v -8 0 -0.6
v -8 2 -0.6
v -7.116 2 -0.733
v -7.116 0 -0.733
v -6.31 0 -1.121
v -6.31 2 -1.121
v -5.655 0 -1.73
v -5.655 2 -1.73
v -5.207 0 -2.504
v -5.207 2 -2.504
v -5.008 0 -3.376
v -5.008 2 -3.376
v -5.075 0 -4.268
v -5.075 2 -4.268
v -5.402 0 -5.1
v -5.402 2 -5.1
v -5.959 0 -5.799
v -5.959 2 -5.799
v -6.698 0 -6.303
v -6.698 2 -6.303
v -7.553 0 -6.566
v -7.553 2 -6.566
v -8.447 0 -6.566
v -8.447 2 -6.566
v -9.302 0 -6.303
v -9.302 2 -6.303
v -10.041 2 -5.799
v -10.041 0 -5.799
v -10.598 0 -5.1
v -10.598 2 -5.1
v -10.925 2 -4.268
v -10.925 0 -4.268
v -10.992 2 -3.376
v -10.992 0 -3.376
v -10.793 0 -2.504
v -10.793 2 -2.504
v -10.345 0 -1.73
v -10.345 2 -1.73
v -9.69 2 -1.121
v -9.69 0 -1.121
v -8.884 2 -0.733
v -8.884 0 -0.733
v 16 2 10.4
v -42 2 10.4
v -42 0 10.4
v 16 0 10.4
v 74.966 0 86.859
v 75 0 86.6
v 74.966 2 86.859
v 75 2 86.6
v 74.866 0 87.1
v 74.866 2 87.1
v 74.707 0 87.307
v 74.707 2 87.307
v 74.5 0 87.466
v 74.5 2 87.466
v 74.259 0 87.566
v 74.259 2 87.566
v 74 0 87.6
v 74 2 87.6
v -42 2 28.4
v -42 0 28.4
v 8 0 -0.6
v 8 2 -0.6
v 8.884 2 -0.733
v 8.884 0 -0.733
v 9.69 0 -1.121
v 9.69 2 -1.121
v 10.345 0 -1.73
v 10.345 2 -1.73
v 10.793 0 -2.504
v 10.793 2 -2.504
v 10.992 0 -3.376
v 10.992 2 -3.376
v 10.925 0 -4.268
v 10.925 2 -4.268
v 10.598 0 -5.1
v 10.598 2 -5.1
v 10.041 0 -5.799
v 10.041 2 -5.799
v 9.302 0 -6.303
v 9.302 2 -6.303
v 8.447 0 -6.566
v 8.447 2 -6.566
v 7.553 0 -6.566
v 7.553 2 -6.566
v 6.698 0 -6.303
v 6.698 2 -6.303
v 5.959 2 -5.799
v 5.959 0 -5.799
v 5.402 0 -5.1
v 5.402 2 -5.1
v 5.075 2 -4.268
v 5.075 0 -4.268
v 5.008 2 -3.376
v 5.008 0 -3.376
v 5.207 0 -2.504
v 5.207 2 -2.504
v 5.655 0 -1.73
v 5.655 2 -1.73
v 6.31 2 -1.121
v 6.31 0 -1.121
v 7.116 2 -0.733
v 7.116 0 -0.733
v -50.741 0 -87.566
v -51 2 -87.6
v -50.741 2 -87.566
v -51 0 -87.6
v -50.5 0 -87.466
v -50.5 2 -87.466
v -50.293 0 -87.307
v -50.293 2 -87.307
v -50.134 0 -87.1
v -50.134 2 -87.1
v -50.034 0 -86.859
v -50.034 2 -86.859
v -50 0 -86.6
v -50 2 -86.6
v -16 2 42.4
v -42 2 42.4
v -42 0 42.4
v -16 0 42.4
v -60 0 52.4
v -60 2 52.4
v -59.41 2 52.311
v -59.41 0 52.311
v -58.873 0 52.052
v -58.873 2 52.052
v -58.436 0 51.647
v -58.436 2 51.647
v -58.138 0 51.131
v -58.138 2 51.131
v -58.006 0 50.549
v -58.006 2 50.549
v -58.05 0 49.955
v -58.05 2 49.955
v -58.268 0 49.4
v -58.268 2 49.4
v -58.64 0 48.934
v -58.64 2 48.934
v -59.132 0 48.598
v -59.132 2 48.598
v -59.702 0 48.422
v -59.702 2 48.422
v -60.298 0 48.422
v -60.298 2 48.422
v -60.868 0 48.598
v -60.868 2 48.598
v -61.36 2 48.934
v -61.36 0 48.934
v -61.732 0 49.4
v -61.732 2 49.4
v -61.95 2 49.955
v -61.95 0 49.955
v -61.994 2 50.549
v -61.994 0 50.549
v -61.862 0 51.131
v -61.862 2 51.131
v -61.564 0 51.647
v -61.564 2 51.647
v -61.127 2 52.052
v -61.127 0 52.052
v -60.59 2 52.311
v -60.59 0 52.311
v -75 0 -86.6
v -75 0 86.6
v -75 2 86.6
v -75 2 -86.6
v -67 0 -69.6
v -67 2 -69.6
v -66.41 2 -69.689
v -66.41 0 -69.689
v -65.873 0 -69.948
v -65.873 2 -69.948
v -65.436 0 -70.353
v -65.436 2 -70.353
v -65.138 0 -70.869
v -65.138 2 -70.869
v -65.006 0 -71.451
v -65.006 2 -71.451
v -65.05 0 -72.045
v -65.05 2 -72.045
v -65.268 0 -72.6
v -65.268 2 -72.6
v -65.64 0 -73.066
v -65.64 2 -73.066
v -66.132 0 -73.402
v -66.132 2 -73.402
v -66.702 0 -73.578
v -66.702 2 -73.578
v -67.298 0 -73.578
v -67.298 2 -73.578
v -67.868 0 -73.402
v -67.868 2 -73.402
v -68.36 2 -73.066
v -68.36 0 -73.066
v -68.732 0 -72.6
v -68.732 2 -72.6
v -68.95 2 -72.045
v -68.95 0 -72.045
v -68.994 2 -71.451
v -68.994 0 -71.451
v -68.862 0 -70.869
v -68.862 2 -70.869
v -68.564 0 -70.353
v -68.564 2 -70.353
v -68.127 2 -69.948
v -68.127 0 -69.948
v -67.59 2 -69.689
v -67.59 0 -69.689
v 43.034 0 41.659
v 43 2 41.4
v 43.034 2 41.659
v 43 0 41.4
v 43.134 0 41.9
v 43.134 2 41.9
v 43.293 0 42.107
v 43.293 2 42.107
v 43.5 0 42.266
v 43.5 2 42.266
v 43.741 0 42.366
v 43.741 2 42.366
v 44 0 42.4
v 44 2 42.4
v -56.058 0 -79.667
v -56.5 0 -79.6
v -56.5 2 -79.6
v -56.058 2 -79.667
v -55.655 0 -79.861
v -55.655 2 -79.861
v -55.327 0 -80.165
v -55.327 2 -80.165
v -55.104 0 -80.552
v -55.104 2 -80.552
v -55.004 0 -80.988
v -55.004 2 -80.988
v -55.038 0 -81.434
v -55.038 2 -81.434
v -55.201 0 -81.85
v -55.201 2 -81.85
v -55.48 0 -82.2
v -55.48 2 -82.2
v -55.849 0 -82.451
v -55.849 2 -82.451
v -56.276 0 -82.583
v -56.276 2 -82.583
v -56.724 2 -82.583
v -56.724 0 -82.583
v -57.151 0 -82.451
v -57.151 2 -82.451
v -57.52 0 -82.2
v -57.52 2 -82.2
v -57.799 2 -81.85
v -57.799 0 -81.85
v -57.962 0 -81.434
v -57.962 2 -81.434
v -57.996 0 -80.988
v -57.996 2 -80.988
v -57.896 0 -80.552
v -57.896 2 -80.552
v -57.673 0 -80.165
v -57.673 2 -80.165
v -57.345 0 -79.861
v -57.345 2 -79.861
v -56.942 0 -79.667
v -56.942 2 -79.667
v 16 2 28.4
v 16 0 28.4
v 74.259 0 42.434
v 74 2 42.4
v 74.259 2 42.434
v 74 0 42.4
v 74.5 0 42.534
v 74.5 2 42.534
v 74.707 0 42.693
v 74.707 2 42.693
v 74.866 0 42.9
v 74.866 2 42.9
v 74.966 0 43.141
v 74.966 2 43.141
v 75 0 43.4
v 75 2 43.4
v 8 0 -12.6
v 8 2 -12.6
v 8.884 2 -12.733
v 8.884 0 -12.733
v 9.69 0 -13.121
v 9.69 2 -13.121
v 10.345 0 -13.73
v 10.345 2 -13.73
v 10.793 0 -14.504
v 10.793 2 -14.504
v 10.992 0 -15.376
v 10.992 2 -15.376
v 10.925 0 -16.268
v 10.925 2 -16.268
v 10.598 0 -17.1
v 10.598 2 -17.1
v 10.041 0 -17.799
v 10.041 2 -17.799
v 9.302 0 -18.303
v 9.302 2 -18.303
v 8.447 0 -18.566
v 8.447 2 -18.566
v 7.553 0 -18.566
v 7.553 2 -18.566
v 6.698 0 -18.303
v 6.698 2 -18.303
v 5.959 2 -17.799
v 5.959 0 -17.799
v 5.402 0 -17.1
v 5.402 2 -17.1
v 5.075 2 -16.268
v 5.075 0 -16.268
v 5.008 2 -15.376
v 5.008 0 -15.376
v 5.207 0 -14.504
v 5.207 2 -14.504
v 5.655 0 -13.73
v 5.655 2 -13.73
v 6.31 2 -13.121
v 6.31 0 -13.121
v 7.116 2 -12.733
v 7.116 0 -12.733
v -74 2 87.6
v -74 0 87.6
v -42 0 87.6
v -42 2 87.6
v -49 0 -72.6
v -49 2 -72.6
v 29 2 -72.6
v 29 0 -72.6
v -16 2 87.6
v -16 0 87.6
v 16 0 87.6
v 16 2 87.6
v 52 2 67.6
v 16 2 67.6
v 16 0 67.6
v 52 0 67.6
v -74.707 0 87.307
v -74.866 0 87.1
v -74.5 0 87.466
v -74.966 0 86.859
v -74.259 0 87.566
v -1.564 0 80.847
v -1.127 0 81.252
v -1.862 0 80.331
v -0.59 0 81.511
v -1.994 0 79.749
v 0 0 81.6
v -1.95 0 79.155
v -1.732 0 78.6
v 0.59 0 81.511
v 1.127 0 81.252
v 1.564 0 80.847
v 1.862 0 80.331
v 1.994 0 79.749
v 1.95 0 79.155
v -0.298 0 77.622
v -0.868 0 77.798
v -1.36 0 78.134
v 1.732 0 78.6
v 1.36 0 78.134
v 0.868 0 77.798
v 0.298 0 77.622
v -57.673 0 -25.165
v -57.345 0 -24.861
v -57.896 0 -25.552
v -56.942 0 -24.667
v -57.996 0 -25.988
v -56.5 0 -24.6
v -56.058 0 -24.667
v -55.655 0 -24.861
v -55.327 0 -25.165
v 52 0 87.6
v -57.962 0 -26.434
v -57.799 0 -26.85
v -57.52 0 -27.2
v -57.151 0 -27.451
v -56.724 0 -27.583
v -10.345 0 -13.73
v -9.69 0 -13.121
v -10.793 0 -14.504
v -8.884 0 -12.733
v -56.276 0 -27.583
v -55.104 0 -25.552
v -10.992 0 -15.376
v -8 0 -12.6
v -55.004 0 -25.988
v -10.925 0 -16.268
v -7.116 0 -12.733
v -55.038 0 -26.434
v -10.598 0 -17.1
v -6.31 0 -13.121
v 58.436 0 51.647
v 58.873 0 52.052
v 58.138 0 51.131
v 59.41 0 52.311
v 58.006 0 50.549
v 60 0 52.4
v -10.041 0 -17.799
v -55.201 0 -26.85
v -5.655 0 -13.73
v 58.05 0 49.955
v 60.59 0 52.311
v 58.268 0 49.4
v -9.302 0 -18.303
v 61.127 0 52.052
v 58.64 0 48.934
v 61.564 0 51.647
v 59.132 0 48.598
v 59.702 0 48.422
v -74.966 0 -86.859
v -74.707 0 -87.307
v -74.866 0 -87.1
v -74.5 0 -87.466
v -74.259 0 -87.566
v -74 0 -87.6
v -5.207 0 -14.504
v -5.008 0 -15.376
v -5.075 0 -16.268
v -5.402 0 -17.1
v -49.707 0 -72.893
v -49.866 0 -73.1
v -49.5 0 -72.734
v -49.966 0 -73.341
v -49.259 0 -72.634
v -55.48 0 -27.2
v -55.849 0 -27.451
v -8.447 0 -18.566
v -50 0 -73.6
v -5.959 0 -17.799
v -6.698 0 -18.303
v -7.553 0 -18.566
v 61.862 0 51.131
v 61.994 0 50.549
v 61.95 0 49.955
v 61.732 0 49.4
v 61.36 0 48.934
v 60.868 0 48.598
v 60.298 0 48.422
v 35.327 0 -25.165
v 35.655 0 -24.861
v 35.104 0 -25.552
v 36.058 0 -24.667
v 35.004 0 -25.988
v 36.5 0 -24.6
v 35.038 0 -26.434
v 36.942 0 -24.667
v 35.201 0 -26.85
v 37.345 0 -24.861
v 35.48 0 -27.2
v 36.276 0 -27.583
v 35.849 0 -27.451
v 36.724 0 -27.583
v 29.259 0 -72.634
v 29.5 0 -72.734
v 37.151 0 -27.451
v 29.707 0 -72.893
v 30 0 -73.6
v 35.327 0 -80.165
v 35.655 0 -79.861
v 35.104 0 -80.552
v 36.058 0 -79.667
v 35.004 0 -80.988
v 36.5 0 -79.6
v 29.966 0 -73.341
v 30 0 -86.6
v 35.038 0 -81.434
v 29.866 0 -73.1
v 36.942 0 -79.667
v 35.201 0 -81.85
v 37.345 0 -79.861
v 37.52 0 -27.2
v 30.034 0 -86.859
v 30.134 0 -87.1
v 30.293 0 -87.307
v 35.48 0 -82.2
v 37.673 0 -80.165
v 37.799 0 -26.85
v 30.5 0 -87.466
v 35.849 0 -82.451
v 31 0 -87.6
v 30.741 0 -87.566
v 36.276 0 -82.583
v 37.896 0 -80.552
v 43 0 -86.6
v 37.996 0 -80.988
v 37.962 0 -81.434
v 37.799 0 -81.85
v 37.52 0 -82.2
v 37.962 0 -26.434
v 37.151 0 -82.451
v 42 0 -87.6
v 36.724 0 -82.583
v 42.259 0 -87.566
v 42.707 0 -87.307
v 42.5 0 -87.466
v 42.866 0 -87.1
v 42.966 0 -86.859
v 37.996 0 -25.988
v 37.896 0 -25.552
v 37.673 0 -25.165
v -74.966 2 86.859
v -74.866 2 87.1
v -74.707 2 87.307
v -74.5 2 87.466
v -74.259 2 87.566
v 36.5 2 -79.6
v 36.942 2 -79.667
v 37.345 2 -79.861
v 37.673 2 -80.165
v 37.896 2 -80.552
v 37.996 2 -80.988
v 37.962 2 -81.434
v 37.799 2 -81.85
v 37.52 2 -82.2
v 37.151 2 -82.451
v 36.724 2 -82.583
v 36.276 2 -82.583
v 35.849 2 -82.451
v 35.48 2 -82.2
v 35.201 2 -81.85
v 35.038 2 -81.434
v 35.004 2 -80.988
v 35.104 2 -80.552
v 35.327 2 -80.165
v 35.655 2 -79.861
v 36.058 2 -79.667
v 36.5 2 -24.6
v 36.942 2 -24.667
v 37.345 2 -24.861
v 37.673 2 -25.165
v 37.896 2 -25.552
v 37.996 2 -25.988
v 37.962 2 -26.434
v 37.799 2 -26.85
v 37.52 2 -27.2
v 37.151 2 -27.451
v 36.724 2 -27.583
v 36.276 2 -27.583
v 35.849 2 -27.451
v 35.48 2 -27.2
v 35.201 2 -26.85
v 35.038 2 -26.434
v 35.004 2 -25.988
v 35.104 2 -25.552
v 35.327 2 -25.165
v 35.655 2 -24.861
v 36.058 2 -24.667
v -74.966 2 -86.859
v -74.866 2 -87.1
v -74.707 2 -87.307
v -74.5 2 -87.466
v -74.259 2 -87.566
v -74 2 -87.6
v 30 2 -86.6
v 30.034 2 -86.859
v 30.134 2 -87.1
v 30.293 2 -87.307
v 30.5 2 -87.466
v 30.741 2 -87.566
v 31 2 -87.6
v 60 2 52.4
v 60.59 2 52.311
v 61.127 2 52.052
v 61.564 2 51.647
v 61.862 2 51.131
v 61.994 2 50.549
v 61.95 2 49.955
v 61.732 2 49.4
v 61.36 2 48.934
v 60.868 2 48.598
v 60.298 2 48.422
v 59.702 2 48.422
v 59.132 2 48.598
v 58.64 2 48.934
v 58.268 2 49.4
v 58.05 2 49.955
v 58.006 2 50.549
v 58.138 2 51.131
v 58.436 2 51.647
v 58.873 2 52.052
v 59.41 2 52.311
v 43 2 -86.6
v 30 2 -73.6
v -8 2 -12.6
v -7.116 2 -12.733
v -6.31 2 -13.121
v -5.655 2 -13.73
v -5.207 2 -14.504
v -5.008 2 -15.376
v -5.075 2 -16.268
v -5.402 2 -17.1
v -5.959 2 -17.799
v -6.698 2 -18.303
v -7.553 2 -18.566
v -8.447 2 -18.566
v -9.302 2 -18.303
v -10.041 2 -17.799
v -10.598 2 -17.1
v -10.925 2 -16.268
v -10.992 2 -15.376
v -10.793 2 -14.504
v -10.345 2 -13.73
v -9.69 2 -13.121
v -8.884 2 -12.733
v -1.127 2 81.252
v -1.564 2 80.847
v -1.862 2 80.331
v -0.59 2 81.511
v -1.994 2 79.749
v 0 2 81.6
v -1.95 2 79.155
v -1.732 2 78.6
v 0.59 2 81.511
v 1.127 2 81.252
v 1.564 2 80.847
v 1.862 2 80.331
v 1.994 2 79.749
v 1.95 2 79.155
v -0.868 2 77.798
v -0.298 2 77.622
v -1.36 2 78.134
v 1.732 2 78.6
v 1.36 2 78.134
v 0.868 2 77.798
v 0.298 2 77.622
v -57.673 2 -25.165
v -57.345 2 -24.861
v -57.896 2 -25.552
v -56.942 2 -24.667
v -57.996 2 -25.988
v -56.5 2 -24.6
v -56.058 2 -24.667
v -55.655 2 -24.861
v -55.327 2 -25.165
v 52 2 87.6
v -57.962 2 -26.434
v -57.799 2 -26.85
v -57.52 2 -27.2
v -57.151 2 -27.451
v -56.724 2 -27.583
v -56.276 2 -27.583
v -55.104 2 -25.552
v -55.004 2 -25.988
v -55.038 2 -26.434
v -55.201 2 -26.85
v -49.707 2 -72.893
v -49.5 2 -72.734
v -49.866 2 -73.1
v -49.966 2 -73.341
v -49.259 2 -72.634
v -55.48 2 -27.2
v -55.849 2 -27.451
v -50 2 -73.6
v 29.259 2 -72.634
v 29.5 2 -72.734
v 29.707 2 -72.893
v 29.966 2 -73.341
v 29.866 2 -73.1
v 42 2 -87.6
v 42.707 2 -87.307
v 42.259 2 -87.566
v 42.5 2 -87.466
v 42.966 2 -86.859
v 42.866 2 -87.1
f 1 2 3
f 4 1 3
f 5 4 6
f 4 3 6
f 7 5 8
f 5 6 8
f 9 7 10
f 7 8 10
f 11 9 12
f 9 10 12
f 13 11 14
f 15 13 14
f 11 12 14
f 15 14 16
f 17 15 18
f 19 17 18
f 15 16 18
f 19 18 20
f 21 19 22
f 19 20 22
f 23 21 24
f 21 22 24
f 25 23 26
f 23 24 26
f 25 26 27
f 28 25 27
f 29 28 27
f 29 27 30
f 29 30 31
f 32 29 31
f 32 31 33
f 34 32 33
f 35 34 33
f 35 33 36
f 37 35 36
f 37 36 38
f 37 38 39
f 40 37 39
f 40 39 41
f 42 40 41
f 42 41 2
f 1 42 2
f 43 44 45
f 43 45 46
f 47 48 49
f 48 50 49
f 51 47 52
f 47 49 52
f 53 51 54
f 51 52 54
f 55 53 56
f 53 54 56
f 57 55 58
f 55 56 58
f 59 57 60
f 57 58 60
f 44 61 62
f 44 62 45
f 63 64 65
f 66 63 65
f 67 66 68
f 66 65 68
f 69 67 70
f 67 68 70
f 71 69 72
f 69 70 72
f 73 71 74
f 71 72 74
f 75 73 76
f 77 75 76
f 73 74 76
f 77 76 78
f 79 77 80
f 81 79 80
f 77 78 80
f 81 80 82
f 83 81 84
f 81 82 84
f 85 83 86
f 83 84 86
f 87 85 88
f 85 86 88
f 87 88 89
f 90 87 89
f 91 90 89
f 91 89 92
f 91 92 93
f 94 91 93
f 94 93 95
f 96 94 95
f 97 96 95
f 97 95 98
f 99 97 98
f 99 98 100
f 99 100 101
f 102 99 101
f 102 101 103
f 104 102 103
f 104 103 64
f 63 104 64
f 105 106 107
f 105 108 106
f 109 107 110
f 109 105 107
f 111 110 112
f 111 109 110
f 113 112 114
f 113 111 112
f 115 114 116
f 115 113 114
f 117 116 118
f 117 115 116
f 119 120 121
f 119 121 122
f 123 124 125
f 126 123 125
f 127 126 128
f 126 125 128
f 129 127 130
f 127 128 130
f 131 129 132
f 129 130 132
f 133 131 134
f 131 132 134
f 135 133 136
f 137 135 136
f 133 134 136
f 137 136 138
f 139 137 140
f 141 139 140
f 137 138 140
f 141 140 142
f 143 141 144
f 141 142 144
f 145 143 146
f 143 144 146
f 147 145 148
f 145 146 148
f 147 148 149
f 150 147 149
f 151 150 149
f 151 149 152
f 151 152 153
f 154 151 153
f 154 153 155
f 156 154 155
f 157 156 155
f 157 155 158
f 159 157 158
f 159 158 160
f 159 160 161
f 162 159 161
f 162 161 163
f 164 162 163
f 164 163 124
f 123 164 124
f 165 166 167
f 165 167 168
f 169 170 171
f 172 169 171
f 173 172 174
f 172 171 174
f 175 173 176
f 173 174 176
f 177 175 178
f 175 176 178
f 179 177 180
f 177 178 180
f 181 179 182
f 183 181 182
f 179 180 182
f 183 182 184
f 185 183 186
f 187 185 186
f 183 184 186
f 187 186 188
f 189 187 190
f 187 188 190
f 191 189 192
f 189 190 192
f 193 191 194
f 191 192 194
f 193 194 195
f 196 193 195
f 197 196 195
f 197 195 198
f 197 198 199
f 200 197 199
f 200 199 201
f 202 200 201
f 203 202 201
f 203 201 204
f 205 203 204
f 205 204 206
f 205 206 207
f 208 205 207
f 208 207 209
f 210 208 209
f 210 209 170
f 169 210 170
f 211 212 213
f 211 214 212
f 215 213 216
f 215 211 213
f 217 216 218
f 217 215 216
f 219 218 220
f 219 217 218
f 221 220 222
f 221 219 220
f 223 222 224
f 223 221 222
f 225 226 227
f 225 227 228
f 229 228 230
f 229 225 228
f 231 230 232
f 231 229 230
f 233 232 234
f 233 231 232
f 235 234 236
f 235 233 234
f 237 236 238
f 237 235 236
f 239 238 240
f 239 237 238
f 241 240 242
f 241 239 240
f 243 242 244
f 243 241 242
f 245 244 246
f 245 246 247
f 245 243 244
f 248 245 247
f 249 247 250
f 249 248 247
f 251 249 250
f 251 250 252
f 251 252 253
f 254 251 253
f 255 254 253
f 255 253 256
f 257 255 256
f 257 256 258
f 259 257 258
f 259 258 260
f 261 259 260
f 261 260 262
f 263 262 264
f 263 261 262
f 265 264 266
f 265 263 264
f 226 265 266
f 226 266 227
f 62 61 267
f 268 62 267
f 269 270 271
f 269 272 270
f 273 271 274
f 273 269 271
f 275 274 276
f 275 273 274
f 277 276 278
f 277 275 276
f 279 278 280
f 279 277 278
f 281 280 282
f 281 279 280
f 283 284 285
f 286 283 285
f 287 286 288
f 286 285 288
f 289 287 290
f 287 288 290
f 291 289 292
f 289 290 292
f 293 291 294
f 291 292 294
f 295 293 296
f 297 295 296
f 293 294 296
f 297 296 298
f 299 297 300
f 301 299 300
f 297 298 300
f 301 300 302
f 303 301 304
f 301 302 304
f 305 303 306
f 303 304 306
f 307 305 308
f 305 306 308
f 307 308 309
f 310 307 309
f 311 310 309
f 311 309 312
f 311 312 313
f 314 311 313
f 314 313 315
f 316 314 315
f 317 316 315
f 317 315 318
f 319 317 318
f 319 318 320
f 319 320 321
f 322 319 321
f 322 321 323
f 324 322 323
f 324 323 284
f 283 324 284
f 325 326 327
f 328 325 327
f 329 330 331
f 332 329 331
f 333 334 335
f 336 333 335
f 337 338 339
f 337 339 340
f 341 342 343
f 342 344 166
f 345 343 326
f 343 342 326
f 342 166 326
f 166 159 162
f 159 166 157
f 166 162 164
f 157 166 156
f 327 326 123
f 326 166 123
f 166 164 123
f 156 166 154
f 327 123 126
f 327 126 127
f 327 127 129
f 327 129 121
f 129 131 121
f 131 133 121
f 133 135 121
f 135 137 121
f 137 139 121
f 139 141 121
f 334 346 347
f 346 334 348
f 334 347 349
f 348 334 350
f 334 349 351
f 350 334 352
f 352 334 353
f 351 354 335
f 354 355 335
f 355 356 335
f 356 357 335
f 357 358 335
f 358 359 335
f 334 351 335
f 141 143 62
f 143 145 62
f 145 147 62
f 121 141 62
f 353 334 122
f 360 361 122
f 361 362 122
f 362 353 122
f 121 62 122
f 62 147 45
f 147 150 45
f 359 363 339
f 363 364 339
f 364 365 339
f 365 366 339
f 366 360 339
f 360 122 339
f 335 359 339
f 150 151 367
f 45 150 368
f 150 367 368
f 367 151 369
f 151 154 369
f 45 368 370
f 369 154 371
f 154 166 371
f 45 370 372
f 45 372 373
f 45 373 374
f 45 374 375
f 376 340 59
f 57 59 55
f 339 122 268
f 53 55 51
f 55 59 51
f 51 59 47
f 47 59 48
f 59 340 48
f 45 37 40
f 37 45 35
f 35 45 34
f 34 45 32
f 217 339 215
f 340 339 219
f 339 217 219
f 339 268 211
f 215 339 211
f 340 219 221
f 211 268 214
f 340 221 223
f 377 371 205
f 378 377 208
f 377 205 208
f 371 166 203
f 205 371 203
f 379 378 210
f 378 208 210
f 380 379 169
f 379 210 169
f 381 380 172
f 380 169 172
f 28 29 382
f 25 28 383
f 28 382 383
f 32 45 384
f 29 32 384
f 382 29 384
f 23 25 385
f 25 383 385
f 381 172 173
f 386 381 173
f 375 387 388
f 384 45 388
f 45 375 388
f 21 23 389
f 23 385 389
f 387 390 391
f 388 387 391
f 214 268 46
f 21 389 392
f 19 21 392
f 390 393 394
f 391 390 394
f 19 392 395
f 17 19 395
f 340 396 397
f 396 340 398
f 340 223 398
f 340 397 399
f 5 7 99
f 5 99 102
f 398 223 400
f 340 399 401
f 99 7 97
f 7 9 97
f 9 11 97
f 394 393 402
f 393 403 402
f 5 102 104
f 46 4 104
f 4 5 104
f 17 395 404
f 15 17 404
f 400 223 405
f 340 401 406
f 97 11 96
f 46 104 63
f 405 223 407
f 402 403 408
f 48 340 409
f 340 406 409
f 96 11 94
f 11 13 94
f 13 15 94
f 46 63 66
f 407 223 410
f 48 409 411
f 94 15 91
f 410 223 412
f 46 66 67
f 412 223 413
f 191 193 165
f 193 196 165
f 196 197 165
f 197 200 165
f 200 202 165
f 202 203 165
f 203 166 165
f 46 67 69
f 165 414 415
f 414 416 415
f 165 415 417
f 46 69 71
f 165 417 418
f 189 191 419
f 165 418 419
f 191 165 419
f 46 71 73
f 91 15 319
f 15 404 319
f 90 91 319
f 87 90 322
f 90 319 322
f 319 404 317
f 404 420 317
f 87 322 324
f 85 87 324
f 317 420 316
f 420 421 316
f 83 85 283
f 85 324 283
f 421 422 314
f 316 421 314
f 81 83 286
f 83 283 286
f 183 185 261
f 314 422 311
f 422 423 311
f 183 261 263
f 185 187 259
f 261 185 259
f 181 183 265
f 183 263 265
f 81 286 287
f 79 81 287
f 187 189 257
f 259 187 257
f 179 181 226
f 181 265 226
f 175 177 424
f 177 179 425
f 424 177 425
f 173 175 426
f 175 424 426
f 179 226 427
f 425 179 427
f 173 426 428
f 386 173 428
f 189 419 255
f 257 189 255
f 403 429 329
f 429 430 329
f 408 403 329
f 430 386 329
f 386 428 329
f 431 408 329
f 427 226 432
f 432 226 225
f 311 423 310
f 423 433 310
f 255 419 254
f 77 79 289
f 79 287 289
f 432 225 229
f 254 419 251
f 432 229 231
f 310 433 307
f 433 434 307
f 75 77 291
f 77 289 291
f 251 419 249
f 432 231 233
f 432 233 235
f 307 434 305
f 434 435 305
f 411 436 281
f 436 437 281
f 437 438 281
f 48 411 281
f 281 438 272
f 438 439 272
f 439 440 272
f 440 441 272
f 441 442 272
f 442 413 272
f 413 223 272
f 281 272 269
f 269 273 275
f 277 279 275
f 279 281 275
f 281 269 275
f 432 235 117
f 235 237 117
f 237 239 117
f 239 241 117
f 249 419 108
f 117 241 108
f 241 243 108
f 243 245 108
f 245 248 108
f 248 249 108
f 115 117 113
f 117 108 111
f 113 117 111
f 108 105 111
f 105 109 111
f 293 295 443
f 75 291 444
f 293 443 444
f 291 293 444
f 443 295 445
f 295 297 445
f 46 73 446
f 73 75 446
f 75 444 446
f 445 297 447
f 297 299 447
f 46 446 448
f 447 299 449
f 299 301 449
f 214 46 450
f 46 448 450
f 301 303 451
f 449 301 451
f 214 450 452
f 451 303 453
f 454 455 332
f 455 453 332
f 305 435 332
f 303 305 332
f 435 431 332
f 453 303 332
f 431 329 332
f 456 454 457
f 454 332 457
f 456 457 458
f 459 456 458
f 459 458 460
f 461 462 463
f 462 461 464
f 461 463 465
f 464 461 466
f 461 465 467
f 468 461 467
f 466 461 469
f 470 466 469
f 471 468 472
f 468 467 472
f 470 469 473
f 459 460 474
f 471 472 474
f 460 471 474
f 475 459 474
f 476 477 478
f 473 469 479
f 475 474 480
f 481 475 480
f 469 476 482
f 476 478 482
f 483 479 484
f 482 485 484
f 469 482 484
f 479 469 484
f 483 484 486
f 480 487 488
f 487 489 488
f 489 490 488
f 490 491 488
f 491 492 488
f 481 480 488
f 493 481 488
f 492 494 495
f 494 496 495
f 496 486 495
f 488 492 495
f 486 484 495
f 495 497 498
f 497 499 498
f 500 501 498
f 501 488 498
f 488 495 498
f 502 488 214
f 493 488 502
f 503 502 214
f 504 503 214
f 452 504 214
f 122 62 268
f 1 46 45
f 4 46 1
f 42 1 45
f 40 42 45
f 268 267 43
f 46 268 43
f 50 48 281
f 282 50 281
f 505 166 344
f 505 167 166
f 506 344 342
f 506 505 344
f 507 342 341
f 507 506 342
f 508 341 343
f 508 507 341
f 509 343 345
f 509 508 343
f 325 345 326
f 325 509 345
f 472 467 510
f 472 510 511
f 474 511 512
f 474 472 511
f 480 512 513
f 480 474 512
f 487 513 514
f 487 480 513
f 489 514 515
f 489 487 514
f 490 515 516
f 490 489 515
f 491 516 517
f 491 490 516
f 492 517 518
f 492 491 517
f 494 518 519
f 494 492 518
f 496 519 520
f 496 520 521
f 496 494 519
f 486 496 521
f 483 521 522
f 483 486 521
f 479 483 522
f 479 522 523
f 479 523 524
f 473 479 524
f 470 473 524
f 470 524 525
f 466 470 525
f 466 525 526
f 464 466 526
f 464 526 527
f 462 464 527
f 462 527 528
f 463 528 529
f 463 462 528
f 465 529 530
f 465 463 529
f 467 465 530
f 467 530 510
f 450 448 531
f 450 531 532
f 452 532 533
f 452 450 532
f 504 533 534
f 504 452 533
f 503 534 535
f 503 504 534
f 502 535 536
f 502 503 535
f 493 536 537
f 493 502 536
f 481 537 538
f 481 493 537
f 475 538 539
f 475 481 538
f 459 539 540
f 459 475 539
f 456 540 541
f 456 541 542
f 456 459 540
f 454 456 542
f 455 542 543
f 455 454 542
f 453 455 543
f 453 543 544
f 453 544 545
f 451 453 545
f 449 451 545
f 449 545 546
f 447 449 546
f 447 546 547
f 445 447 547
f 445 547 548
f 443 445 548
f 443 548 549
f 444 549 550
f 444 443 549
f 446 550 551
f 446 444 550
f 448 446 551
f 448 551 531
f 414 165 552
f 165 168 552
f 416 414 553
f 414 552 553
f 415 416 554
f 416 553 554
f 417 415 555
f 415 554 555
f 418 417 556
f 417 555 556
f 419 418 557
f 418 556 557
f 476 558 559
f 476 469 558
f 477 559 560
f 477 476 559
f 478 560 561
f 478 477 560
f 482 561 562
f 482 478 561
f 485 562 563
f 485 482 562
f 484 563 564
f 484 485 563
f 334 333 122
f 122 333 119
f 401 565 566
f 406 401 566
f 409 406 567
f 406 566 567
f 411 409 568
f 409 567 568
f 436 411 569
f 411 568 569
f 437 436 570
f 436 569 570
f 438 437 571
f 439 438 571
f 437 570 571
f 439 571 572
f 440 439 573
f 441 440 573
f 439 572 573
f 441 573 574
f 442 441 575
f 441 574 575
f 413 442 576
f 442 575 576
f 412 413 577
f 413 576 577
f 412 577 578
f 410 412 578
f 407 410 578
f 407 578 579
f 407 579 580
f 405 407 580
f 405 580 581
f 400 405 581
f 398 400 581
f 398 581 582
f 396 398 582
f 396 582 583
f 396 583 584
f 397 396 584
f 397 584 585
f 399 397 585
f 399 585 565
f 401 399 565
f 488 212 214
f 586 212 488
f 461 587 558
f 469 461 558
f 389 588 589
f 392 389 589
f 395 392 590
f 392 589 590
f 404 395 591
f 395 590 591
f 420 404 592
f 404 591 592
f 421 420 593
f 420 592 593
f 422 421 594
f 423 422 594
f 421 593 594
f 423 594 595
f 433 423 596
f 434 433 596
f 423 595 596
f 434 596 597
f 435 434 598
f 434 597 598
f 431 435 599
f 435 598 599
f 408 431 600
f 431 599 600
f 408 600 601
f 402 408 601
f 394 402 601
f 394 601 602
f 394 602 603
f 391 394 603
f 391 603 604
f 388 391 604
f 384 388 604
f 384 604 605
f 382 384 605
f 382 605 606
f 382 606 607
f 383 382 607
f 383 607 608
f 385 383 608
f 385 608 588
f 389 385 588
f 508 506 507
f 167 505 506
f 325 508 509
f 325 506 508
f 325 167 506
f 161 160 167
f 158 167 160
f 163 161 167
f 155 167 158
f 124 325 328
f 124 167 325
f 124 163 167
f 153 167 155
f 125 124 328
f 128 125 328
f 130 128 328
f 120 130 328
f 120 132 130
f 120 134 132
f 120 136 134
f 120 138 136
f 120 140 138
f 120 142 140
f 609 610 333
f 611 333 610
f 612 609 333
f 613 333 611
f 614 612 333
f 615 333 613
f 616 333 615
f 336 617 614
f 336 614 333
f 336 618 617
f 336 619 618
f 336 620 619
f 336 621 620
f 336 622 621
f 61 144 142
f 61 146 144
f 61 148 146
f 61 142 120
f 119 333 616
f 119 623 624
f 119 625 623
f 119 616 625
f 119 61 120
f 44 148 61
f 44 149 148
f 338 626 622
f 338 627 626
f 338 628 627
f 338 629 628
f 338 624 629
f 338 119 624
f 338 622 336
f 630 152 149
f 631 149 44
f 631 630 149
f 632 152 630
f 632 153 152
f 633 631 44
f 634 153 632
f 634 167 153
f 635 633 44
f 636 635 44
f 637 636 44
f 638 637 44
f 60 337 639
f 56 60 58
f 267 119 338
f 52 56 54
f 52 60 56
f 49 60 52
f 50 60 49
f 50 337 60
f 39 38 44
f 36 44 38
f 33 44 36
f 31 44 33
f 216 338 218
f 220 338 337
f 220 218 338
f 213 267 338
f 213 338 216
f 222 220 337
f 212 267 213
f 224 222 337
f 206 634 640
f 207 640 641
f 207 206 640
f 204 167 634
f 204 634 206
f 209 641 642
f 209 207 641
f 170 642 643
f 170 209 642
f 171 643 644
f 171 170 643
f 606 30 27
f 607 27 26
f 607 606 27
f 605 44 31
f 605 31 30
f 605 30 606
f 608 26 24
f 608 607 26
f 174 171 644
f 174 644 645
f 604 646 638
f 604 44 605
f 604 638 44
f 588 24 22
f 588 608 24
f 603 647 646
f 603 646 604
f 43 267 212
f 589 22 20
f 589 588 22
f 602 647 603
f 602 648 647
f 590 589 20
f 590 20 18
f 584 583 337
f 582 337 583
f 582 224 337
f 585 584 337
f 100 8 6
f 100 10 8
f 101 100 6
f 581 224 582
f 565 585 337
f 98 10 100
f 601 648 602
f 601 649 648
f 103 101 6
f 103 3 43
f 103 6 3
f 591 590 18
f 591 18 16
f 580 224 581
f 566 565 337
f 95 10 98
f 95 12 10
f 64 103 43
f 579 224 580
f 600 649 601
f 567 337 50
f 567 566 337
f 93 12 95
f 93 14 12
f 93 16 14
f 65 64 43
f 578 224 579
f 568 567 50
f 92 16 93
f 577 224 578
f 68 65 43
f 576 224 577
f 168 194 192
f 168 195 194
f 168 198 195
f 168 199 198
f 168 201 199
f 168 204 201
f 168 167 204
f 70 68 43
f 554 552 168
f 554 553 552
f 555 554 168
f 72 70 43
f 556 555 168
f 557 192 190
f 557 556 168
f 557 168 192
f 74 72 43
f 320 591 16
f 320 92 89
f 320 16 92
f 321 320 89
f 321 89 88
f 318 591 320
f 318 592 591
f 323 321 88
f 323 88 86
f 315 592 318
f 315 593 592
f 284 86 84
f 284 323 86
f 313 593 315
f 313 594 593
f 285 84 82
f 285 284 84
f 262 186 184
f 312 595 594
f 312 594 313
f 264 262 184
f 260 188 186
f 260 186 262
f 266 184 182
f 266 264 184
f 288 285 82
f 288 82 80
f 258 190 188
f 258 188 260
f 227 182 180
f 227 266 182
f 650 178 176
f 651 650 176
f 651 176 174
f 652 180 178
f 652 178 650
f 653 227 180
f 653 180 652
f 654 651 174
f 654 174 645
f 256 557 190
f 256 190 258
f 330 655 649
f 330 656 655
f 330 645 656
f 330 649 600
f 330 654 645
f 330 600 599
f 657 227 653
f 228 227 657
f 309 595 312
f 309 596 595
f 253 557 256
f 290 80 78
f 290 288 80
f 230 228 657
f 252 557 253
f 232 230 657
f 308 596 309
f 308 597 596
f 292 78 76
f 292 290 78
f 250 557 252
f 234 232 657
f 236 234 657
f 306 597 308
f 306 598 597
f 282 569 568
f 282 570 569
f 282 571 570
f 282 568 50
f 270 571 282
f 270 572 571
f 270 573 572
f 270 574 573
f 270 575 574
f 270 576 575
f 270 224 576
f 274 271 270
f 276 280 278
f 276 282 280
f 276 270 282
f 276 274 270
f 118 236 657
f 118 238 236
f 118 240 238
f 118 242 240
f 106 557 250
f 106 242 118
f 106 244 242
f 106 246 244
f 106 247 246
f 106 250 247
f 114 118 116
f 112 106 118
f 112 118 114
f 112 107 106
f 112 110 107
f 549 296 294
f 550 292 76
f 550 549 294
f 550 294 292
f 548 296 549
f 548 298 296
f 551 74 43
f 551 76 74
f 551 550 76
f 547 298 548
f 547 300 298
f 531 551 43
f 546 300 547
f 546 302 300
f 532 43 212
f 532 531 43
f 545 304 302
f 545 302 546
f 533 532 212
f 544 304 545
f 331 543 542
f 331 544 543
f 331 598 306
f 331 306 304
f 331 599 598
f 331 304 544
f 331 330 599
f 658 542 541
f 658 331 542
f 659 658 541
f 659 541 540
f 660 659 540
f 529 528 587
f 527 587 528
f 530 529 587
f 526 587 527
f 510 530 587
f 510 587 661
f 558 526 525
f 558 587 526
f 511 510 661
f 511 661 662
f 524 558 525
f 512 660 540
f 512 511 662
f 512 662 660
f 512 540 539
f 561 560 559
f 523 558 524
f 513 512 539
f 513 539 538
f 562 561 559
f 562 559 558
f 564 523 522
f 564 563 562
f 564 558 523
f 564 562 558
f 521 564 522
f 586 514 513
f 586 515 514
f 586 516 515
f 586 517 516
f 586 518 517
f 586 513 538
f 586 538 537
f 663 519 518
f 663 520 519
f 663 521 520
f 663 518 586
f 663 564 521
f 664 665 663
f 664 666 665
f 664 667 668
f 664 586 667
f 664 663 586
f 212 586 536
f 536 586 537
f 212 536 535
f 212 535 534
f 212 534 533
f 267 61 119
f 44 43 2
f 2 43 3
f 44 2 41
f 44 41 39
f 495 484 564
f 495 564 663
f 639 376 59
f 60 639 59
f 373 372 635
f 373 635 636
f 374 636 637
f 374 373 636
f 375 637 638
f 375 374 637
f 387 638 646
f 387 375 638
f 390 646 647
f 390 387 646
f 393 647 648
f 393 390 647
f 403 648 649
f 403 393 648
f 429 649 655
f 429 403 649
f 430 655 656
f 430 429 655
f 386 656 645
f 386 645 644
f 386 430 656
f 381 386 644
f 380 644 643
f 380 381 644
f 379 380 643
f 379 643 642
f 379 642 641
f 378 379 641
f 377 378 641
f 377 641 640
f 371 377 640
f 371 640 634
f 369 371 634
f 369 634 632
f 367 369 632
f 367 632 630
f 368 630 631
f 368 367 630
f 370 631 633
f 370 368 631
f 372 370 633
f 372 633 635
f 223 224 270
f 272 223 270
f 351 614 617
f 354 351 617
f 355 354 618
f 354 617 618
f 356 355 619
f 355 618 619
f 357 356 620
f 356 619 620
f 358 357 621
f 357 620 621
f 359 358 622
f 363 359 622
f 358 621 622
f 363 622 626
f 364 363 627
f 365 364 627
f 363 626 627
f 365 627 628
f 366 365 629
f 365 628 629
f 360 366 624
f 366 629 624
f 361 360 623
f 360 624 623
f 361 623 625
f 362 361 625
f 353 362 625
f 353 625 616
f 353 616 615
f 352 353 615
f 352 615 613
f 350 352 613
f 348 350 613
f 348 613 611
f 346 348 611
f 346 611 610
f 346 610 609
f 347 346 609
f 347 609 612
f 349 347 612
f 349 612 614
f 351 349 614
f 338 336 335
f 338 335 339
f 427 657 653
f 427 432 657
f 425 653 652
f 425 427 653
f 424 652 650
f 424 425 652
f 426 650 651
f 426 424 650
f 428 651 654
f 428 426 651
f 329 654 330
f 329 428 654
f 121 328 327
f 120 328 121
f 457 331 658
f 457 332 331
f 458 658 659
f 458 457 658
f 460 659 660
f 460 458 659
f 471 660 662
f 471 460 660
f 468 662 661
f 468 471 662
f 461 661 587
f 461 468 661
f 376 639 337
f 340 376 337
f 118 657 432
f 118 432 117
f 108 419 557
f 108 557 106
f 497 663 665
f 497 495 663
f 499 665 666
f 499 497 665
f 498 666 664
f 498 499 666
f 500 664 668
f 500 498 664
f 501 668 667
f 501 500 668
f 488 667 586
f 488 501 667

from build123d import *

# Parameters (mm, degrees)
CROQUIS1_W         = 150
CROQUIS1_H         = 175.2
CROQUIS1_R         = 1.5
EXTRUIR1_DEPTH     = 2
CROQUIS2_W         = 80
CROQUIS2_H         = 15
EXTRUIR2_DEPTH     = 10
CROQUIS3_W         = 32
CROQUIS3_H         = 130
EXTRUIR3_DEPTH     = 10
CROQUIS4_R         = 2
EXTRUIR4_DEPTH     = 10
CROQUIS5_R         = 3
EXTRUIR5_DEPTH     = 10
MATRIZL1_COUNT     = 2
MATRIZL1_PITCH     = 8
MATRIZL1_COL_COUNT = 2
MATRIZL1_COL_PITCH = 8
CROQUIS6_R         = 3
EXTRUIR6_DEPTH     = 2
CROQUIS7_W         = 26
CROQUIS7_H         = 45.2
CROQUIS7_W_2       = 36
CROQUIS7_H_2       = 20
CROQUIS7_W_3       = 58
CROQUIS7_H_3       = 18
EXTRUIR7_DEPTH     = 10
REDONDEO1_R        = 1


with BuildPart() as part:
    # Croquis1 → Extruir1 (new body)
    with BuildSketch(Plane(origin=(0, 0, 0), x_dir=(1, 0, 0), z_dir=(0, 1, 0))):
        Rectangle(CROQUIS1_W, CROQUIS1_H)
        with Locations(Location((-56.5, 81.1, 0), (0, 0, 270))):
            Circle(CROQUIS1_R, mode=Mode.SUBTRACT)
        with Locations(Location((36.5, 81.1, 0), (0, 0, 270))):
            Circle(CROQUIS1_R, mode=Mode.SUBTRACT)
        with Locations(Location((-56.5, 26.1, 0), (0, 0, 270))):
            Circle(CROQUIS1_R, mode=Mode.SUBTRACT)
        with Locations(Location((36.5, 26.1, 0), (0, 0, 270))):
            Circle(CROQUIS1_R, mode=Mode.SUBTRACT)
    extrude(amount=EXTRUIR1_DEPTH)

    # Croquis2 → Extruir2 (cut)
    with BuildSketch(Plane(origin=(0, 2, 0), x_dir=(1, 0, 0), z_dir=(0, 1, 0))):
        with Locations((-10, 80.1)):
            Rectangle(CROQUIS2_W, CROQUIS2_H)
    extrude(amount=-EXTRUIR2_DEPTH, mode=Mode.SUBTRACT)

    # Croquis3 → Extruir3 (cut)
    with BuildSketch(Plane(origin=(0, 2, 0), x_dir=(1, 0, 0), z_dir=(0, 1, 0))):
        with Locations((59, 22.6)):
            Rectangle(CROQUIS3_W, CROQUIS3_H)
    extrude(amount=-EXTRUIR3_DEPTH, mode=Mode.SUBTRACT)

    # Croquis4 → Extruir4 (cut)
    with BuildSketch(Plane(origin=(0, 2, 0), x_dir=(1, 0, 0), z_dir=(0, 1, 0))):
        with Locations(Location((-60, -50.4, 0), (0, 0, 270))):
            Circle(CROQUIS4_R)
        with Locations(Location((60, -50.4, 0), (0, 0, 270))):
            Circle(CROQUIS4_R)
        with Locations(Location((-67, 71.6, 0), (0, 0, 270))):
            Circle(CROQUIS4_R)
        with Locations(Location((0, -79.6, 0), (0, 0, 270))):
            Circle(CROQUIS4_R)
    extrude(amount=-EXTRUIR4_DEPTH, mode=Mode.SUBTRACT)

    # Croquis5 → Extruir5 (cut)
    with BuildSketch(Plane(origin=(0, 2, 0), x_dir=(1, 0, 0), z_dir=(0, 1, 0))):
        with Locations(Location((0, 15.6, 0), (0, 0, 270))):
            Circle(CROQUIS5_R)
        with Locations(Location((0, 3.6, 0), (0, 0, 270))):
            Circle(CROQUIS5_R)
    extruir5 = extrude(amount=-EXTRUIR5_DEPTH, mode=Mode.SUBTRACT)

    # MatrizL1: Extruir5 ×2
    with Locations(*[(-i * MATRIZL1_PITCH, 0, 0) for i in range(1, MATRIZL1_COUNT)]):
        add(extruir5, mode=Mode.SUBTRACT)

    # MatrizL1 col: Extruir5 ×2
    with Locations(*[(i * MATRIZL1_COL_PITCH, 0, 0) for i in range(1, MATRIZL1_COL_COUNT)]):
        add(extruir5, mode=Mode.SUBTRACT)

    # Croquis6 → Extruir6 (add)
    with BuildSketch(Plane(origin=(0, 2, 0), x_dir=(1, 0, 0), z_dir=(0, 1, 0))):
        with Locations((0, 15.6)):
            Circle(CROQUIS6_R)
        with Locations((0, 3.6)):
            Circle(CROQUIS6_R)
    extrude(amount=-EXTRUIR6_DEPTH)

    # Croquis7 → Extruir7 (cut)
    with BuildSketch(Plane(origin=(0, 2, 0), x_dir=(1, 0, 0), z_dir=(0, 1, 0))):
        with Locations((-29, -65)):
            Rectangle(CROQUIS7_W, CROQUIS7_H)
        with Locations((34, -77.6)):
            Rectangle(CROQUIS7_W_2, CROQUIS7_H_2)
        with Locations((-13, -19.4)):
            Rectangle(CROQUIS7_W_3, CROQUIS7_H_3)
    extrude(amount=-EXTRUIR7_DEPTH, mode=Mode.SUBTRACT)

    # Redondeo1
    redondeo1_edges = [part.edges().sort_by_distance(p)[0] for p in [
        (30, 1, -87.6),
        (-50, 1, -87.6),
        (30, 1, -72.6),
        (-50, 1, -72.6),
        (43, 1, -87.6),
        (75, 1, 42.4),
        (43, 1, 42.4),
        (-75, 1, -87.6),
        (75, 1, 87.6),
        (-75, 1, 87.6),
    ]]
    fillet(redondeo1_edges, radius=REDONDEO1_R)


solid = part.part
